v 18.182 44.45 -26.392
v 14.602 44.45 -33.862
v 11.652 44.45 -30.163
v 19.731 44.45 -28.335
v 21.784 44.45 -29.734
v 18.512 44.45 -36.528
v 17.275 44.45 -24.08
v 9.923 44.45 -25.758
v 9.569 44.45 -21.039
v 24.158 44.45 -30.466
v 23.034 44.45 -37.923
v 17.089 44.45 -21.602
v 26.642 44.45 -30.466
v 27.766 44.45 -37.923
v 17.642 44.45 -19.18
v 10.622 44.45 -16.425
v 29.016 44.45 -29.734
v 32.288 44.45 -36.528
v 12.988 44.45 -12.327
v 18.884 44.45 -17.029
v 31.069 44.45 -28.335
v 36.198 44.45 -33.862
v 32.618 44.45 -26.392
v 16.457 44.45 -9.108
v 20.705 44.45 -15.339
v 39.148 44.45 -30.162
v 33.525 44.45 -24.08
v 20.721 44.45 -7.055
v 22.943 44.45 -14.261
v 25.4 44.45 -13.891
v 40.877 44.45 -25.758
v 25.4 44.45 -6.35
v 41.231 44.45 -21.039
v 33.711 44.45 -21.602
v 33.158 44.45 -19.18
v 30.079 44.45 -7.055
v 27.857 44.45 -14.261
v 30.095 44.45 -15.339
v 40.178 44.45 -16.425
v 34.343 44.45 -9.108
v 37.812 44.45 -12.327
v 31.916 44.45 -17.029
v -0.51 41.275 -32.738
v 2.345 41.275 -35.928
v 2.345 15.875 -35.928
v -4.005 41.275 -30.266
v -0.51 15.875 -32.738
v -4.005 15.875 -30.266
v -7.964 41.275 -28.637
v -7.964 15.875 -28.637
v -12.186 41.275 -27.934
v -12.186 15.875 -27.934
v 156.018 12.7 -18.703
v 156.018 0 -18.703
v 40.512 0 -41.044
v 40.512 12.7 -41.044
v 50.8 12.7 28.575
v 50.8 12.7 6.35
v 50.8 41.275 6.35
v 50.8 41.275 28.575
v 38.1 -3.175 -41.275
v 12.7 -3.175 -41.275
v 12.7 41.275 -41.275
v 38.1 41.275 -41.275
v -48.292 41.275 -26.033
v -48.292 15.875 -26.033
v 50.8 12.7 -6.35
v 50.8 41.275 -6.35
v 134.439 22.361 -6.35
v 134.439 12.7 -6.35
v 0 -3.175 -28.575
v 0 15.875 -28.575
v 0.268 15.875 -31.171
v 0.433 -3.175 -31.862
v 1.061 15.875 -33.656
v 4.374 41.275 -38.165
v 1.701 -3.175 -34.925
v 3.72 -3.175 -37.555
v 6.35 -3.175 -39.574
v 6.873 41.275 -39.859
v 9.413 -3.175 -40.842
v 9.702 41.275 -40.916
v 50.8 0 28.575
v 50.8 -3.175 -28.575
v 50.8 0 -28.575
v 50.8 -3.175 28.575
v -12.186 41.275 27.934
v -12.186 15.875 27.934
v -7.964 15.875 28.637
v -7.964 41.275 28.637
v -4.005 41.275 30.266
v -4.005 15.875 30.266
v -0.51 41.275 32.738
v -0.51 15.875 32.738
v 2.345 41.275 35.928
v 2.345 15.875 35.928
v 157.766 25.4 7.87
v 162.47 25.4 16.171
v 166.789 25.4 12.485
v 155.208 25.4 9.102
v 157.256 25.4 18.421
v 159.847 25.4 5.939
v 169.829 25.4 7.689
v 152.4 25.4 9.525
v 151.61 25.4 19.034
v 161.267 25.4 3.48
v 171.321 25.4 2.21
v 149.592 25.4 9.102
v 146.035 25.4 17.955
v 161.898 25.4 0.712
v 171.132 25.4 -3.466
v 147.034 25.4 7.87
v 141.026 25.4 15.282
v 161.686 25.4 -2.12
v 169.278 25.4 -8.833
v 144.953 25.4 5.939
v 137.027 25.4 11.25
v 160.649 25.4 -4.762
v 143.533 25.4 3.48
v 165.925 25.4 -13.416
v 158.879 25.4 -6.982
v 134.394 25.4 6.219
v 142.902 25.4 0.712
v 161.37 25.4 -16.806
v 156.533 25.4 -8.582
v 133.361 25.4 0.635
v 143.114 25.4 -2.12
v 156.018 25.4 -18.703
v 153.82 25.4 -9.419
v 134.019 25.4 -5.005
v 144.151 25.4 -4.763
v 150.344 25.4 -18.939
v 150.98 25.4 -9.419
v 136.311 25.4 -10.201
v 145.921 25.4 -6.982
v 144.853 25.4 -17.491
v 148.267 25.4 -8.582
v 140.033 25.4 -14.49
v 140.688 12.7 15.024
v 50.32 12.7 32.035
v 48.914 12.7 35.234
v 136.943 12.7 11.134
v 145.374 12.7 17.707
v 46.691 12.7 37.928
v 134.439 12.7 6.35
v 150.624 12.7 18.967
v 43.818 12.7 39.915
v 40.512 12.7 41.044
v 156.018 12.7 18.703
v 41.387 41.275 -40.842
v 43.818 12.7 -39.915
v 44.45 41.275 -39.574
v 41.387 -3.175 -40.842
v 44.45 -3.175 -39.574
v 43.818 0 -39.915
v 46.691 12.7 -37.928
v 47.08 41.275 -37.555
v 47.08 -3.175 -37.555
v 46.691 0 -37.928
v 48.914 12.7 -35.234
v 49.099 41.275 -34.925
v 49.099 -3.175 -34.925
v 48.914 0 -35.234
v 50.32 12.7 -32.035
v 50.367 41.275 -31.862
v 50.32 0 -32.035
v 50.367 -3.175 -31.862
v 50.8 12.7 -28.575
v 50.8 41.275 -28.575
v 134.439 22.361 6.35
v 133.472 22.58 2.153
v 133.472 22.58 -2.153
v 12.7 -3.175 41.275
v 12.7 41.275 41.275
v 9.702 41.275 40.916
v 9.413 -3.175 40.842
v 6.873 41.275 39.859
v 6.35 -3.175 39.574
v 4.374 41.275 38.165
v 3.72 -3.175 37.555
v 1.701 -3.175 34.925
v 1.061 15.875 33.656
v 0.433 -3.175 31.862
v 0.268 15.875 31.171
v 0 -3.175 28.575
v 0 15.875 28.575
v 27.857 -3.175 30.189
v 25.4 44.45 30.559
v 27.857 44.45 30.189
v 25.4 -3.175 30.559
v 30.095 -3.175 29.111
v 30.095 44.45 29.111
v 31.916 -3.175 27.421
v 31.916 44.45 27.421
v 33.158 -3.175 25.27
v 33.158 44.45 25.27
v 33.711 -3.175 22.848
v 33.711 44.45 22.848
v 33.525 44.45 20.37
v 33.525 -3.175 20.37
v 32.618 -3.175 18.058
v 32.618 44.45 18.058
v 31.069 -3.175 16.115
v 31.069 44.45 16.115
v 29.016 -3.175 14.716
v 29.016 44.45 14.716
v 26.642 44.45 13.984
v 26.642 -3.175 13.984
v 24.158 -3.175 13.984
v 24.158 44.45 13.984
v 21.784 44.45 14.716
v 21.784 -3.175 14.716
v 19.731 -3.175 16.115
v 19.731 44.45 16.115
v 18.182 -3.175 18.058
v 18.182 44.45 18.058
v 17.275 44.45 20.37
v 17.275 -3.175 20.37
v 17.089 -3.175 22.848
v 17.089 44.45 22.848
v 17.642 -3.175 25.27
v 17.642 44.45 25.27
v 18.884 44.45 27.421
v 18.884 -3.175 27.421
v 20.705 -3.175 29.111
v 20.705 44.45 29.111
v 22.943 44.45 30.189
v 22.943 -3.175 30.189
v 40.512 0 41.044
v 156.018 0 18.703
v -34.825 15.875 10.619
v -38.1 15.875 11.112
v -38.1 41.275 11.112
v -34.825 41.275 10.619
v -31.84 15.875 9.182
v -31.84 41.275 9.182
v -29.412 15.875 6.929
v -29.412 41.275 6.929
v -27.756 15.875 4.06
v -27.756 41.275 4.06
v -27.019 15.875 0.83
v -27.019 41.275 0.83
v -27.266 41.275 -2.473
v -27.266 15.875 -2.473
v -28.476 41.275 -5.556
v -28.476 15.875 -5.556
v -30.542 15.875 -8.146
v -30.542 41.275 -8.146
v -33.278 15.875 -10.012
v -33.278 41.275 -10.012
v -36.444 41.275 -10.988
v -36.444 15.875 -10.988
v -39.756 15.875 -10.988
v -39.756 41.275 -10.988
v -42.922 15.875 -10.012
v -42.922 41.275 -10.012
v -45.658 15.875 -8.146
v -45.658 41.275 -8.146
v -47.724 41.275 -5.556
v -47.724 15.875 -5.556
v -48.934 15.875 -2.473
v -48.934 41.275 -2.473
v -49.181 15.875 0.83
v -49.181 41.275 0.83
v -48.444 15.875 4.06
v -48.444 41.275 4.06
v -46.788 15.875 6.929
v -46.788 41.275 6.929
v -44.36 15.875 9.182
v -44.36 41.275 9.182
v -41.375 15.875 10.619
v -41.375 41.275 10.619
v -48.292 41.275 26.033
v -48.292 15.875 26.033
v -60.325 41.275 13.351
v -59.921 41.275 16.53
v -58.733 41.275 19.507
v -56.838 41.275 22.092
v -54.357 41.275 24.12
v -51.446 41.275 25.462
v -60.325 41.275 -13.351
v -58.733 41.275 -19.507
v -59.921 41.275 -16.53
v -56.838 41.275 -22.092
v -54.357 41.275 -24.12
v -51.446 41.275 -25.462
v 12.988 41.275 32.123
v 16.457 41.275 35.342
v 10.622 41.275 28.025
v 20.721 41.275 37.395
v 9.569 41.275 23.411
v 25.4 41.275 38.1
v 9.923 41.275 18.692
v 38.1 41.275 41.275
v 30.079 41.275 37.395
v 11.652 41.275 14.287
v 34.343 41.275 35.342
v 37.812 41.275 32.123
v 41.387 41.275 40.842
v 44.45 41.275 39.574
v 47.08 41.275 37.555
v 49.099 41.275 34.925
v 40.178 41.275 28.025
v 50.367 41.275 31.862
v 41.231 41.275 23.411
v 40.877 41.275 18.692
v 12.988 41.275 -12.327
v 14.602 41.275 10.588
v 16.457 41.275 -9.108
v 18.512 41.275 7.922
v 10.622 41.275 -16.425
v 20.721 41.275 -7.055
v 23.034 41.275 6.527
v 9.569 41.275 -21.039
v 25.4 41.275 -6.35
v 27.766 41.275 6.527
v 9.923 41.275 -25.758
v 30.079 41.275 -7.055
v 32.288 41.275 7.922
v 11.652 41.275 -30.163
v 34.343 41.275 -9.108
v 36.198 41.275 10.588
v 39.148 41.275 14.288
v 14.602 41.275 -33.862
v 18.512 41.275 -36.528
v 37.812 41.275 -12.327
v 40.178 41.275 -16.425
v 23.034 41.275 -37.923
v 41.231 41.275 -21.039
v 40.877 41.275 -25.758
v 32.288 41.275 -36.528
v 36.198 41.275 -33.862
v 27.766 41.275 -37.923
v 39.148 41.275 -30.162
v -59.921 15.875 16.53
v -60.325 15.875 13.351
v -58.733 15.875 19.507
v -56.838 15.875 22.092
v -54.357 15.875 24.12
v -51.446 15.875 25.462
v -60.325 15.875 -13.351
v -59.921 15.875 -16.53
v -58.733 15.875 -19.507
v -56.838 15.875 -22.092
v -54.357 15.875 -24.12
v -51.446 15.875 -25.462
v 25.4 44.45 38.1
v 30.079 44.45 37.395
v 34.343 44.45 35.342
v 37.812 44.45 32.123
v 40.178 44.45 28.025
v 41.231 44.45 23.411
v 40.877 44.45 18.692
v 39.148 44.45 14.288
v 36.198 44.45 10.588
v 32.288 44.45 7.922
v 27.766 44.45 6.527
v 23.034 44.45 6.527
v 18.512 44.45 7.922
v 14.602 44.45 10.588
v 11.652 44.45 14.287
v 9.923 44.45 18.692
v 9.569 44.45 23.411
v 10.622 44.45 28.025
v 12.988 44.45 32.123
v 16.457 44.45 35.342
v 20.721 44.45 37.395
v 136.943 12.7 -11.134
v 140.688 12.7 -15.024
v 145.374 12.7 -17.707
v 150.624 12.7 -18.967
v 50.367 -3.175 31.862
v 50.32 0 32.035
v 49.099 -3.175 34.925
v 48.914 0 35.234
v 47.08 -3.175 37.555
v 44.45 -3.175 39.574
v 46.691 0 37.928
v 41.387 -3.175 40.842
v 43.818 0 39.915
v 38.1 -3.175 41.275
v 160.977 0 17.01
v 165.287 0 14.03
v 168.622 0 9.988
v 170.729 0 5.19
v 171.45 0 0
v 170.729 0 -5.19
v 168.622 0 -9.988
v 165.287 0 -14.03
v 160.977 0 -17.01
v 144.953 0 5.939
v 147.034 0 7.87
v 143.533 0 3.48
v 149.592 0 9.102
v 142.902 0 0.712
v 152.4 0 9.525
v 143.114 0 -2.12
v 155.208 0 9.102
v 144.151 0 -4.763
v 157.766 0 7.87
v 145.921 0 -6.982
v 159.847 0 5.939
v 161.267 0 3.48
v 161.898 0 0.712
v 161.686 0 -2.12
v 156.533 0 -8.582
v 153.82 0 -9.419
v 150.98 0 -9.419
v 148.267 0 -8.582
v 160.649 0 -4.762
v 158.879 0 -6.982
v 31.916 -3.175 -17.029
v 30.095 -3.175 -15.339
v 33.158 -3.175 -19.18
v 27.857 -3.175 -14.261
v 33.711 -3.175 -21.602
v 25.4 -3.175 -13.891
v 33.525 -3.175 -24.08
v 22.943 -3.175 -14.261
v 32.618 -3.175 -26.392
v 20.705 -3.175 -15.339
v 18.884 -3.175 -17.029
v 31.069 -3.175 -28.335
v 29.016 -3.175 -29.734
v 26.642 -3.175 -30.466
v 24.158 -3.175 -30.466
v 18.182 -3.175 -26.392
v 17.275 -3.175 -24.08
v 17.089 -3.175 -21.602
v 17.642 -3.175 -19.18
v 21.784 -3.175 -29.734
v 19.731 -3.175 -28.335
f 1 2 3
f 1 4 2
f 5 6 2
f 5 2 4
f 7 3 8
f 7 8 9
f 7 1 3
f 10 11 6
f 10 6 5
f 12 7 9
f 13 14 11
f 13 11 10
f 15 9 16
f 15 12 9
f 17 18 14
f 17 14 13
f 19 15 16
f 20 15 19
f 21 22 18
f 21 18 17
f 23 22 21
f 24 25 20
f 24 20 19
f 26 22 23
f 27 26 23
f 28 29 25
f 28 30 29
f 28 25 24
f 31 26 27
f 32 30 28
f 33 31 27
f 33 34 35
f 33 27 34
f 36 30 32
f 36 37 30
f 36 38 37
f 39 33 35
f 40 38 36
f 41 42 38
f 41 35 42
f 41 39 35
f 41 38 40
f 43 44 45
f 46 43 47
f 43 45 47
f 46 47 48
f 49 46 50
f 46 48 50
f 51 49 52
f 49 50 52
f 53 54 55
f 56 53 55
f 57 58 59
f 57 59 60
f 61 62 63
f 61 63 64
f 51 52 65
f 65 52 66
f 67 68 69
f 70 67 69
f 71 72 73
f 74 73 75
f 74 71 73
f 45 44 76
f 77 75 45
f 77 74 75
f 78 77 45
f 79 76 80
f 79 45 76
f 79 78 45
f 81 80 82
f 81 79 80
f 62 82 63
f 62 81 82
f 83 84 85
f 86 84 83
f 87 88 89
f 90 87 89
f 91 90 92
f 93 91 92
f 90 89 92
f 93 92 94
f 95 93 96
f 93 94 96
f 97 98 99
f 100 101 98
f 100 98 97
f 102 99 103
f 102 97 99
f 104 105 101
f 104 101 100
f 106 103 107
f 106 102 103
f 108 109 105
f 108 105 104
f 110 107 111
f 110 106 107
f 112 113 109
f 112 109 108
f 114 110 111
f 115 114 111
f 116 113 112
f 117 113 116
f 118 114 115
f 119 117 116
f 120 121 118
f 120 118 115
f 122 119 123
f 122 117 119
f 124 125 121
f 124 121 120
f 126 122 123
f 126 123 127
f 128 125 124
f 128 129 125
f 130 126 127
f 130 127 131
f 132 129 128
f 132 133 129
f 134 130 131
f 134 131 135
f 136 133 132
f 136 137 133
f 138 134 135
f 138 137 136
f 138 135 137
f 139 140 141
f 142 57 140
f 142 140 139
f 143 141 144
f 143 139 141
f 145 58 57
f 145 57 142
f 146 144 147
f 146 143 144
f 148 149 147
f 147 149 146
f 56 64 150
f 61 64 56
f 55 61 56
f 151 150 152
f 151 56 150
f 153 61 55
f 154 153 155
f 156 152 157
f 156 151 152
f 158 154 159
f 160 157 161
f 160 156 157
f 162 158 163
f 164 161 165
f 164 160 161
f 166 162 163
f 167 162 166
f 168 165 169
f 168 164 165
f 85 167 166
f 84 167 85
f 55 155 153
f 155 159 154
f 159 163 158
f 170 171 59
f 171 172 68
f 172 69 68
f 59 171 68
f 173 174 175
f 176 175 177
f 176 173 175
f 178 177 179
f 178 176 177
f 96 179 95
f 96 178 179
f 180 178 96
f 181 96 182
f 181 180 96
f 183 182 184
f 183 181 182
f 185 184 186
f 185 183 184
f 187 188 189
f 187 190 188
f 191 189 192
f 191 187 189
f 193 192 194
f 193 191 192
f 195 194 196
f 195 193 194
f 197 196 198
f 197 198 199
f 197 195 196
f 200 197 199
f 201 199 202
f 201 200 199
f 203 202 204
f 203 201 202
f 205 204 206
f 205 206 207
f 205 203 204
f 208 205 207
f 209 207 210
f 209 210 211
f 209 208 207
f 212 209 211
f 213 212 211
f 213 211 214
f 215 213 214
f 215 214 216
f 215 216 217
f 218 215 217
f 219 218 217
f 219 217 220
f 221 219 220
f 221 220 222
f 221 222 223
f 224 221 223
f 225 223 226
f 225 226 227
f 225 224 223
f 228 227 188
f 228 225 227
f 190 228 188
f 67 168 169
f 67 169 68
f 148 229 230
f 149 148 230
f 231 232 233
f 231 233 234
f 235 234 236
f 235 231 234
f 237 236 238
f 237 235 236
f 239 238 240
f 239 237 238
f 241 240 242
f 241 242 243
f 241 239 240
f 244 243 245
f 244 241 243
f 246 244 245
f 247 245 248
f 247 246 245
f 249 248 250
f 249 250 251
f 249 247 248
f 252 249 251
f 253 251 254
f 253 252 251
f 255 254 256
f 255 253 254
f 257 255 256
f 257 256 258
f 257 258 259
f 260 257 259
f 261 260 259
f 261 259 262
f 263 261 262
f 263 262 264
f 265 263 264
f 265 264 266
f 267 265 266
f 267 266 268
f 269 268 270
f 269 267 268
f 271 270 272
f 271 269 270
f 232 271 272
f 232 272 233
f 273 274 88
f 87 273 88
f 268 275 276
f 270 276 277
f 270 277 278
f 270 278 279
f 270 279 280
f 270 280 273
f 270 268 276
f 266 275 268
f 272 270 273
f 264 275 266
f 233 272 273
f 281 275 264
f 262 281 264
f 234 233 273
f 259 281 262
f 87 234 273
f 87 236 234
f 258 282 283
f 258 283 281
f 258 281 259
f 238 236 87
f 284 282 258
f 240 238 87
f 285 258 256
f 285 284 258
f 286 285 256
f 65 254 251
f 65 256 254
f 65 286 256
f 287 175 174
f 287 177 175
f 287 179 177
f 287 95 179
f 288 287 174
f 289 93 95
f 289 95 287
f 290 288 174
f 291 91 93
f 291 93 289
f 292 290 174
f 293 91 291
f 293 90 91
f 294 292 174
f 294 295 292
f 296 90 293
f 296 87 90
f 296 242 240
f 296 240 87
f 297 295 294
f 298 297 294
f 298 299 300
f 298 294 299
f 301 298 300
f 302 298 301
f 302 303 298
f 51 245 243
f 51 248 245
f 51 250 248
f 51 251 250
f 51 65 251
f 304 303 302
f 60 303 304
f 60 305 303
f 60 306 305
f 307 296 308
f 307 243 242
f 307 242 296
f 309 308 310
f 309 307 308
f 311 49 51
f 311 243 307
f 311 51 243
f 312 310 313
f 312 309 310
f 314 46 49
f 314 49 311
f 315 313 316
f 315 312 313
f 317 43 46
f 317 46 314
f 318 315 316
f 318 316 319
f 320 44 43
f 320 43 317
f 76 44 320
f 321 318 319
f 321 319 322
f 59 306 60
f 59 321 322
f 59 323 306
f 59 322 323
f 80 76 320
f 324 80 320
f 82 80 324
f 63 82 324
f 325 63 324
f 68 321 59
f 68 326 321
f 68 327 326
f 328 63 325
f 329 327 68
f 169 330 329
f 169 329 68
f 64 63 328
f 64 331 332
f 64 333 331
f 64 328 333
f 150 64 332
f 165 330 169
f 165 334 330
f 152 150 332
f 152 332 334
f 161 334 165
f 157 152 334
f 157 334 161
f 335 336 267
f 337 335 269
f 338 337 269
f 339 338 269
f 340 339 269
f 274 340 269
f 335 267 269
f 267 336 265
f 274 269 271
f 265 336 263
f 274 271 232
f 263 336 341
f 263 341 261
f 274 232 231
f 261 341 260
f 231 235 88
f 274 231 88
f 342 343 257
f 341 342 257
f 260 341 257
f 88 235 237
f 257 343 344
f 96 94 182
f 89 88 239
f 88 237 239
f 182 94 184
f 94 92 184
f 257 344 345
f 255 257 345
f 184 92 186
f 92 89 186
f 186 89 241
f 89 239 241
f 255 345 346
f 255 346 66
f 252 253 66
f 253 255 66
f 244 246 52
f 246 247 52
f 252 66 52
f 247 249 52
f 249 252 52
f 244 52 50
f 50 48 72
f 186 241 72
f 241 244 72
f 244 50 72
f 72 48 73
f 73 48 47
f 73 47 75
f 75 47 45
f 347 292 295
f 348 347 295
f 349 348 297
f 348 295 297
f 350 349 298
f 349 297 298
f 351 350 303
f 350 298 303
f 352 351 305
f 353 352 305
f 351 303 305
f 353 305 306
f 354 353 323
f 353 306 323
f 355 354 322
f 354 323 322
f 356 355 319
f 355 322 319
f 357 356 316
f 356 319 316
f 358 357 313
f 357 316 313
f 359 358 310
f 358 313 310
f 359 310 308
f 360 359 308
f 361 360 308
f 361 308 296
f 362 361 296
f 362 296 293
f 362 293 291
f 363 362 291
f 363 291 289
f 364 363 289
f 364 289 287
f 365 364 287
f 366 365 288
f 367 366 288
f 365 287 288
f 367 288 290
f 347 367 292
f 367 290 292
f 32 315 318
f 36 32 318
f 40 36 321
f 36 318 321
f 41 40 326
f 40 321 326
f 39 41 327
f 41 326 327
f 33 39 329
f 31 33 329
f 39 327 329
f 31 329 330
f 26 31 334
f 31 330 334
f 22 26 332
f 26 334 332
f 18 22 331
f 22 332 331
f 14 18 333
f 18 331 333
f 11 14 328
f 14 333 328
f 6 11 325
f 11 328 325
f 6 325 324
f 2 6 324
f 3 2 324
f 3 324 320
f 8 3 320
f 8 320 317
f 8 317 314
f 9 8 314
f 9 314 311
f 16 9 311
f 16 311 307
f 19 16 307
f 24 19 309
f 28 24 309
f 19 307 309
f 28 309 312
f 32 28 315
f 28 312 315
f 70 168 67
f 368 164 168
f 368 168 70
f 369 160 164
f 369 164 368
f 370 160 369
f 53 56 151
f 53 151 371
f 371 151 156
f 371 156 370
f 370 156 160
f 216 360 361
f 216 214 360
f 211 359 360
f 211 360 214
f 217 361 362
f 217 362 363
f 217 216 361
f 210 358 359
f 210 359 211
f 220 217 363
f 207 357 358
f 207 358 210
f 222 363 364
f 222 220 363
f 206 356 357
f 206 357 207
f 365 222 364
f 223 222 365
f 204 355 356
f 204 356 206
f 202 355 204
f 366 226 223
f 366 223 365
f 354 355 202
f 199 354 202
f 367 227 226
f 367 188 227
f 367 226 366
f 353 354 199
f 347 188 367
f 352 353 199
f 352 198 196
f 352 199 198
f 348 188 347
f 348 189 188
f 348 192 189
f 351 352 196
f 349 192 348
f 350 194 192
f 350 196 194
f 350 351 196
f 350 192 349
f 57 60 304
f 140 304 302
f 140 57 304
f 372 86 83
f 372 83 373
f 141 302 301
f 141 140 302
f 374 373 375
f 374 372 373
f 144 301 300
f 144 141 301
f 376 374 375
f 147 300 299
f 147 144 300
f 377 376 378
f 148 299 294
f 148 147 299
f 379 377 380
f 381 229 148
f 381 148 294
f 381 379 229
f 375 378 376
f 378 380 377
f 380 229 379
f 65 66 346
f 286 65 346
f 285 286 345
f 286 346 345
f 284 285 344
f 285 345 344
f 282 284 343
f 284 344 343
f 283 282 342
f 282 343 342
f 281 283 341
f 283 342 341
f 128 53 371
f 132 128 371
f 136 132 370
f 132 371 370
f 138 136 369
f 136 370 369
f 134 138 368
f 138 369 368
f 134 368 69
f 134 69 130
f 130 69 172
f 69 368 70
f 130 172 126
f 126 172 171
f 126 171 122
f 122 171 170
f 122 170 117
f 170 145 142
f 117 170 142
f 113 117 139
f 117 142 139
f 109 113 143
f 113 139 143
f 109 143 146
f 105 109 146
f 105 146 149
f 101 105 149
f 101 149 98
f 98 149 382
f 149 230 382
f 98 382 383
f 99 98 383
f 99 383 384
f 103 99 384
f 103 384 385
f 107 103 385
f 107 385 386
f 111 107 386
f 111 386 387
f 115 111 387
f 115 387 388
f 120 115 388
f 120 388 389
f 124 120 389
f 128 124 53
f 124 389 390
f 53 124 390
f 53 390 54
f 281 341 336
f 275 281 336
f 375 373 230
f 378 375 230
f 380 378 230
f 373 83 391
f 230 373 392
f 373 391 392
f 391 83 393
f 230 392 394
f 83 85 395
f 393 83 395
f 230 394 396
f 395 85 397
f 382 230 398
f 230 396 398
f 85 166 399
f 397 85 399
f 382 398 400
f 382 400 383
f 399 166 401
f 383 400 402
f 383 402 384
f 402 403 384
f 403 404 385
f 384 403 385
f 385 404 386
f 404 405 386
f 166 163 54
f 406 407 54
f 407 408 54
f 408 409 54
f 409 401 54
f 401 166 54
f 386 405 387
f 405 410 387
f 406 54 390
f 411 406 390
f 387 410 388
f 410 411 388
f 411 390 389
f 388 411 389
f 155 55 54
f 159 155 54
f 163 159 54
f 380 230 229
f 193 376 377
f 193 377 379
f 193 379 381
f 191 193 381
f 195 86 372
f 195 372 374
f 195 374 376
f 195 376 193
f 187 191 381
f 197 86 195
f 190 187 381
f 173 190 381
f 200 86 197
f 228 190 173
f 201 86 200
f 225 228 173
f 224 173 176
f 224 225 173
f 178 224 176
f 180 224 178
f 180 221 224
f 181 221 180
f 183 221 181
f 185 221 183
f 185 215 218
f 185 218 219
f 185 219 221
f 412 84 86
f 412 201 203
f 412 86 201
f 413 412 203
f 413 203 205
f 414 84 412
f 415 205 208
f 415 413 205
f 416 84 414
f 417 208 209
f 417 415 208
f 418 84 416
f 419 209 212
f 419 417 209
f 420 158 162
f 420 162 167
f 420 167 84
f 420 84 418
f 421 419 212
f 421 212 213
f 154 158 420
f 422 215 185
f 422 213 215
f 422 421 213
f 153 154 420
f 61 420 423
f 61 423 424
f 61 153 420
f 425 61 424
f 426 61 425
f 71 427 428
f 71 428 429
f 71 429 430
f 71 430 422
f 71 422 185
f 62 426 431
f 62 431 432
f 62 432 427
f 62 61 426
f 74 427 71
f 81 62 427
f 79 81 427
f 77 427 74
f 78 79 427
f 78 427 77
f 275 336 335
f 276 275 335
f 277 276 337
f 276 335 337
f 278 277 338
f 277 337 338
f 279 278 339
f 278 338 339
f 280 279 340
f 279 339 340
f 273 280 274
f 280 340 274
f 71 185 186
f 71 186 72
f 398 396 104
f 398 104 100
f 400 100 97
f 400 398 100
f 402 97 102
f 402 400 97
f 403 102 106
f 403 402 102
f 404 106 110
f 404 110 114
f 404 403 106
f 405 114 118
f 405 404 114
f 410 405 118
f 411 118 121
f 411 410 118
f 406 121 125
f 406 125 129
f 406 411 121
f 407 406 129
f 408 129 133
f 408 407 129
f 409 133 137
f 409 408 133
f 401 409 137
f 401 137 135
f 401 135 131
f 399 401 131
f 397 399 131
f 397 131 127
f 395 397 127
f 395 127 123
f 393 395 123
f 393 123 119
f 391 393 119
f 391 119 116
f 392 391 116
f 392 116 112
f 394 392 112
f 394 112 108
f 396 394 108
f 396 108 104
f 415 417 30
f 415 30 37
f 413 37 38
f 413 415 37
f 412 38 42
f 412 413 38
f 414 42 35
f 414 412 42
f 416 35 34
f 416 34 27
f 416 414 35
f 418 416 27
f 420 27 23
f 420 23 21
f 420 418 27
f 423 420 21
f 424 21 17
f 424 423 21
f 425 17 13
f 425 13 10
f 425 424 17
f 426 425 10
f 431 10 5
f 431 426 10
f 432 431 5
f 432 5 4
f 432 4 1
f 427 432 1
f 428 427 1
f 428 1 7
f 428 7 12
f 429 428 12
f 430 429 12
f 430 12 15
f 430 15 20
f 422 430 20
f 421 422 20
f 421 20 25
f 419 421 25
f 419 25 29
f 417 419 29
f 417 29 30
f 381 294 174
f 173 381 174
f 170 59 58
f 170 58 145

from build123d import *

# Parameters (mm, degrees)
SKETCH1_R                = 8.334375
SKETCH1_R_2              = 19.05
SKETCH1_R_3              = 9.525
SKETCH1_R_4              = 15.875
BOSS_EXTRUDE3_DEPTH      = 12.7
BOSS_EXTRUDE4_DEPTH      = 41.275
BOSS_EXTRUDE4_DEPTH_BACK = 3.175
SKETCH1_5_R              = 8.334375
SKETCH1_5_R_2            = 15.875
SKETCH1_6_R              = 19.05
SKETCH1_6_R_2            = 9.525
BOSS_EXTRUDE5_DEPTH      = 25.4
RIB1_START               = -6.35
RIB1_DEPTH               = 12.7
BOSS_EXTRUDE6_START      = 41.275
SKETCH1_7_R              = 15.875
SKETCH1_7_R_2            = 8.334375
BOSS_EXTRUDE6_DEPTH      = 3.175
BOSS_EXTRUDE8_START      = -25.4
SKETCH4_R                = 11.1125
BOSS_EXTRUDE8_DEPTH      = 25.4


# Read off the part's stored shape, not the designer's step: Rib1
with BuildPart() as part:
    # Sketch1 → Boss-Extrude3 (new body)
    # profile 1 of 5: a face of its own
    with BuildSketch(Plane(origin=(0, 0, 0), x_dir=(1, 0, 0), z_dir=(0, 1, 0))):
        with BuildLine():
            ThreePointArc((40.51167311, 41.043914661), (47.895872817, 36.657751744), (50.8, 28.575))
            Line((50.8, 28.575), (50.8, -28.575))
            ThreePointArc((50.8, -28.575), (47.895872817, -36.657751744), (40.51167311, -41.043914661))
            Line((40.51167311, -41.043914661), (156.017509664, -18.703371991))
            ThreePointArc((156.017509664, -18.703371991), (133.35, 0), (156.017509664, 18.703371991))
            Line((156.017509664, 18.703371991), (40.51167311, 41.043914661))
        make_face()
    # profile 2 of 5: a face of its own
    with BuildSketch(Plane(origin=(0, 0, 0), x_dir=(1, 0, 0), z_dir=(0, 1, 0))):
        with BuildLine():
            ThreePointArc((38.1, 41.275), (47.080256121, 37.555256121), (50.8, 28.575))
            Line((50.8, 28.575), (50.8, -28.575))
            ThreePointArc((50.8, -28.575), (47.080256121, -37.555256121), (38.1, -41.275))
            Line((38.1, -41.275), (12.7, -41.275))
            ThreePointArc((12.7, -41.275), (3.719743879, -37.555256121), (0, -28.575))
            Line((0, -28.575), (0, 28.575))
            ThreePointArc((0, 28.575), (3.719743879, 37.555256121), (12.7, 41.275))
            Line((12.7, 41.275), (38.1, 41.275))
        make_face()
        with Locations(Location((25.4, -22.225, 0), (0, 0, 270))):
            Circle(SKETCH1_R, mode=Mode.SUBTRACT)
        with Locations(Location((25.4, 22.225, 0), (0, 0, 270))):
            Circle(SKETCH1_R, mode=Mode.SUBTRACT)
    # profile 3 of 5: a face of its own
    with BuildSketch(Plane(origin=(0, 0, 0), x_dir=(1, 0, 0), z_dir=(0, 1, 0))):
        with Locations((152.4, 0)):
            Circle(SKETCH1_R_2)
        with Locations(Location((152.4, 0, 0), (0, 0, 270))):
            Circle(SKETCH1_R_3, mode=Mode.SUBTRACT)
    # profile 4 of 5: a face of its own
    with BuildSketch(Plane(origin=(0, 0, 0), x_dir=(1, 0, 0), z_dir=(0, 1, 0))):
        with Locations((25.4, 22.225)):
            Circle(SKETCH1_R_4)
        with Locations(Location((25.4, 22.225, 0), (0, 0, 270))):
            Circle(SKETCH1_R, mode=Mode.SUBTRACT)
    # profile 5 of 5: a face of its own
    with BuildSketch(Plane(origin=(0, 0, 0), x_dir=(1, 0, 0), z_dir=(0, 1, 0))):
        with Locations((25.4, -22.225)):
            Circle(SKETCH1_R_4)
        with Locations(Location((25.4, -22.225, 0), (0, 0, 270))):
            Circle(SKETCH1_R, mode=Mode.SUBTRACT)
    extrude(amount=BOSS_EXTRUDE3_DEPTH)

    # Sketch1<5> → Boss-Extrude4 (add, two sides: drawn at the far end of the back side and taken through both)
    # profile 1 of 3: a face of its own
    with BuildSketch(Plane(origin=(0, 0, 0), x_dir=(1, 0, 0), z_dir=(0, 1, 0)).offset(-BOSS_EXTRUDE4_DEPTH_BACK)):
        with BuildLine():
            ThreePointArc((38.1, 41.275), (47.080256121, 37.555256121), (50.8, 28.575))
            Line((50.8, 28.575), (50.8, -28.575))
            ThreePointArc((50.8, -28.575), (47.080256121, -37.555256121), (38.1, -41.275))
            Line((38.1, -41.275), (12.7, -41.275))
            ThreePointArc((12.7, -41.275), (3.719743879, -37.555256121), (0, -28.575))
            Line((0, -28.575), (0, 28.575))
            ThreePointArc((0, 28.575), (3.719743879, 37.555256121), (12.7, 41.275))
            Line((12.7, 41.275), (38.1, 41.275))
        make_face()
        with Locations(Location((25.4, -22.225, 0), (0, 0, 270))):
            Circle(SKETCH1_5_R, mode=Mode.SUBTRACT)
        with Locations(Location((25.4, 22.225, 0), (0, 0, 270))):
            Circle(SKETCH1_5_R, mode=Mode.SUBTRACT)
    # profile 2 of 3: a face of its own
    with BuildSketch(Plane(origin=(0, 0, 0), x_dir=(1, 0, 0), z_dir=(0, 1, 0)).offset(-BOSS_EXTRUDE4_DEPTH_BACK)):
        with Locations((25.4, -22.225)):
            Circle(SKETCH1_5_R_2)
        with Locations(Location((25.4, -22.225, 0), (0, 0, 270))):
            Circle(SKETCH1_5_R, mode=Mode.SUBTRACT)
    # profile 3 of 3: a face of its own
    with BuildSketch(Plane(origin=(0, 0, 0), x_dir=(1, 0, 0), z_dir=(0, 1, 0)).offset(-BOSS_EXTRUDE4_DEPTH_BACK)):
        with Locations((25.4, 22.225)):
            Circle(SKETCH1_5_R_2)
        with Locations(Location((25.4, 22.225, 0), (0, 0, 270))):
            Circle(SKETCH1_5_R, mode=Mode.SUBTRACT)
    extrude(amount=BOSS_EXTRUDE4_DEPTH + BOSS_EXTRUDE4_DEPTH_BACK)

    # Sketch1<6> → Boss-Extrude5 (add)
    with BuildSketch(Plane(origin=(0, 0, 0), x_dir=(1, 0, 0), z_dir=(0, 1, 0))):
        with Locations(Location((152.4, 0, 0), (0, 0, 79.053313044))):
            Circle(SKETCH1_6_R)
        with Locations(Location((152.4, 0, 0), (0, 0, 270))):
            Circle(SKETCH1_6_R_2, mode=Mode.SUBTRACT)
    extrude(amount=BOSS_EXTRUDE5_DEPTH)

    # Rib1 outline → Rib1 (add)
    with BuildSketch(Plane.XY.offset(RIB1_START)):
        Polygon((134.439487758, 22.361197239), (50.8, 41.275), (50.8, 12.7), (136, 12.7), (136, 22.008311042), align=None)
    extrude(amount=RIB1_DEPTH)

    # Sketch1<7> → Boss-Extrude6 (add)
    # profile 1 of 2: a face of its own
    with BuildSketch(Plane(origin=(0, 0, 0), x_dir=(1, 0, 0), z_dir=(0, 1, 0)).offset(BOSS_EXTRUDE6_START)):
        with Locations(Location((25.4, -22.225, 0), (0, 0, 270))):
            Circle(SKETCH1_7_R)
        with Locations(Location((25.4, -22.225, 0), (0, 0, 270))):
            Circle(SKETCH1_7_R_2, mode=Mode.SUBTRACT)
    # profile 2 of 2: a face of its own
    with BuildSketch(Plane(origin=(0, 0, 0), x_dir=(1, 0, 0), z_dir=(0, 1, 0)).offset(BOSS_EXTRUDE6_START)):
        with Locations(Location((25.4, 22.225, 0), (0, 0, 270))):
            Circle(SKETCH1_7_R)
        with Locations(Location((25.4, 22.225, 0), (0, 0, 270))):
            Circle(SKETCH1_7_R_2, mode=Mode.SUBTRACT)
    extrude(amount=BOSS_EXTRUDE6_DEPTH)

    # Sketch4 → Boss-Extrude8 (add)
    with BuildSketch(Plane(origin=(0, 41.275, 0), x_dir=(1, 0, 0), z_dir=(0, 1, 0)).offset(BOSS_EXTRUDE8_START)):
        with BuildLine():
            ThreePointArc((0, 28.575), (0.600462467, 32.43391066), (2.345069525, 35.927918798))
            ThreePointArc((2.345069525, 35.927918798), (-4.004870137, 30.266431204), (-12.186080417, 27.933627346))
            Line((-12.186080417, 27.933627346), (-48.292497181, 26.033289622))
            ThreePointArc((-48.292497181, 26.033289622), (-56.838230003, 22.091918232), (-60.325, 13.35084319))
            Line((-60.325, 13.35084319), (-60.325, -13.35084319))
            ThreePointArc((-60.325, -13.35084319), (-56.838230003, -22.091918232), (-48.292497181, -26.033289622))
            Line((-48.292497181, -26.033289622), (-12.186080417, -27.933627346))
            ThreePointArc((-12.186080417, -27.933627346), (-4.004870137, -30.266431204), (2.345069525, -35.927918798))
            ThreePointArc((2.345069525, -35.927918798), (0.600462467, -32.43391066), (0, -28.575))
            Line((0, -28.575), (0, 28.575))
        make_face()
        with Locations(Location((-38.1, 0, 0), (0, 0, 270))):
            Circle(SKETCH4_R, mode=Mode.SUBTRACT)
    extrude(amount=BOSS_EXTRUDE8_DEPTH)


solid = part.part
